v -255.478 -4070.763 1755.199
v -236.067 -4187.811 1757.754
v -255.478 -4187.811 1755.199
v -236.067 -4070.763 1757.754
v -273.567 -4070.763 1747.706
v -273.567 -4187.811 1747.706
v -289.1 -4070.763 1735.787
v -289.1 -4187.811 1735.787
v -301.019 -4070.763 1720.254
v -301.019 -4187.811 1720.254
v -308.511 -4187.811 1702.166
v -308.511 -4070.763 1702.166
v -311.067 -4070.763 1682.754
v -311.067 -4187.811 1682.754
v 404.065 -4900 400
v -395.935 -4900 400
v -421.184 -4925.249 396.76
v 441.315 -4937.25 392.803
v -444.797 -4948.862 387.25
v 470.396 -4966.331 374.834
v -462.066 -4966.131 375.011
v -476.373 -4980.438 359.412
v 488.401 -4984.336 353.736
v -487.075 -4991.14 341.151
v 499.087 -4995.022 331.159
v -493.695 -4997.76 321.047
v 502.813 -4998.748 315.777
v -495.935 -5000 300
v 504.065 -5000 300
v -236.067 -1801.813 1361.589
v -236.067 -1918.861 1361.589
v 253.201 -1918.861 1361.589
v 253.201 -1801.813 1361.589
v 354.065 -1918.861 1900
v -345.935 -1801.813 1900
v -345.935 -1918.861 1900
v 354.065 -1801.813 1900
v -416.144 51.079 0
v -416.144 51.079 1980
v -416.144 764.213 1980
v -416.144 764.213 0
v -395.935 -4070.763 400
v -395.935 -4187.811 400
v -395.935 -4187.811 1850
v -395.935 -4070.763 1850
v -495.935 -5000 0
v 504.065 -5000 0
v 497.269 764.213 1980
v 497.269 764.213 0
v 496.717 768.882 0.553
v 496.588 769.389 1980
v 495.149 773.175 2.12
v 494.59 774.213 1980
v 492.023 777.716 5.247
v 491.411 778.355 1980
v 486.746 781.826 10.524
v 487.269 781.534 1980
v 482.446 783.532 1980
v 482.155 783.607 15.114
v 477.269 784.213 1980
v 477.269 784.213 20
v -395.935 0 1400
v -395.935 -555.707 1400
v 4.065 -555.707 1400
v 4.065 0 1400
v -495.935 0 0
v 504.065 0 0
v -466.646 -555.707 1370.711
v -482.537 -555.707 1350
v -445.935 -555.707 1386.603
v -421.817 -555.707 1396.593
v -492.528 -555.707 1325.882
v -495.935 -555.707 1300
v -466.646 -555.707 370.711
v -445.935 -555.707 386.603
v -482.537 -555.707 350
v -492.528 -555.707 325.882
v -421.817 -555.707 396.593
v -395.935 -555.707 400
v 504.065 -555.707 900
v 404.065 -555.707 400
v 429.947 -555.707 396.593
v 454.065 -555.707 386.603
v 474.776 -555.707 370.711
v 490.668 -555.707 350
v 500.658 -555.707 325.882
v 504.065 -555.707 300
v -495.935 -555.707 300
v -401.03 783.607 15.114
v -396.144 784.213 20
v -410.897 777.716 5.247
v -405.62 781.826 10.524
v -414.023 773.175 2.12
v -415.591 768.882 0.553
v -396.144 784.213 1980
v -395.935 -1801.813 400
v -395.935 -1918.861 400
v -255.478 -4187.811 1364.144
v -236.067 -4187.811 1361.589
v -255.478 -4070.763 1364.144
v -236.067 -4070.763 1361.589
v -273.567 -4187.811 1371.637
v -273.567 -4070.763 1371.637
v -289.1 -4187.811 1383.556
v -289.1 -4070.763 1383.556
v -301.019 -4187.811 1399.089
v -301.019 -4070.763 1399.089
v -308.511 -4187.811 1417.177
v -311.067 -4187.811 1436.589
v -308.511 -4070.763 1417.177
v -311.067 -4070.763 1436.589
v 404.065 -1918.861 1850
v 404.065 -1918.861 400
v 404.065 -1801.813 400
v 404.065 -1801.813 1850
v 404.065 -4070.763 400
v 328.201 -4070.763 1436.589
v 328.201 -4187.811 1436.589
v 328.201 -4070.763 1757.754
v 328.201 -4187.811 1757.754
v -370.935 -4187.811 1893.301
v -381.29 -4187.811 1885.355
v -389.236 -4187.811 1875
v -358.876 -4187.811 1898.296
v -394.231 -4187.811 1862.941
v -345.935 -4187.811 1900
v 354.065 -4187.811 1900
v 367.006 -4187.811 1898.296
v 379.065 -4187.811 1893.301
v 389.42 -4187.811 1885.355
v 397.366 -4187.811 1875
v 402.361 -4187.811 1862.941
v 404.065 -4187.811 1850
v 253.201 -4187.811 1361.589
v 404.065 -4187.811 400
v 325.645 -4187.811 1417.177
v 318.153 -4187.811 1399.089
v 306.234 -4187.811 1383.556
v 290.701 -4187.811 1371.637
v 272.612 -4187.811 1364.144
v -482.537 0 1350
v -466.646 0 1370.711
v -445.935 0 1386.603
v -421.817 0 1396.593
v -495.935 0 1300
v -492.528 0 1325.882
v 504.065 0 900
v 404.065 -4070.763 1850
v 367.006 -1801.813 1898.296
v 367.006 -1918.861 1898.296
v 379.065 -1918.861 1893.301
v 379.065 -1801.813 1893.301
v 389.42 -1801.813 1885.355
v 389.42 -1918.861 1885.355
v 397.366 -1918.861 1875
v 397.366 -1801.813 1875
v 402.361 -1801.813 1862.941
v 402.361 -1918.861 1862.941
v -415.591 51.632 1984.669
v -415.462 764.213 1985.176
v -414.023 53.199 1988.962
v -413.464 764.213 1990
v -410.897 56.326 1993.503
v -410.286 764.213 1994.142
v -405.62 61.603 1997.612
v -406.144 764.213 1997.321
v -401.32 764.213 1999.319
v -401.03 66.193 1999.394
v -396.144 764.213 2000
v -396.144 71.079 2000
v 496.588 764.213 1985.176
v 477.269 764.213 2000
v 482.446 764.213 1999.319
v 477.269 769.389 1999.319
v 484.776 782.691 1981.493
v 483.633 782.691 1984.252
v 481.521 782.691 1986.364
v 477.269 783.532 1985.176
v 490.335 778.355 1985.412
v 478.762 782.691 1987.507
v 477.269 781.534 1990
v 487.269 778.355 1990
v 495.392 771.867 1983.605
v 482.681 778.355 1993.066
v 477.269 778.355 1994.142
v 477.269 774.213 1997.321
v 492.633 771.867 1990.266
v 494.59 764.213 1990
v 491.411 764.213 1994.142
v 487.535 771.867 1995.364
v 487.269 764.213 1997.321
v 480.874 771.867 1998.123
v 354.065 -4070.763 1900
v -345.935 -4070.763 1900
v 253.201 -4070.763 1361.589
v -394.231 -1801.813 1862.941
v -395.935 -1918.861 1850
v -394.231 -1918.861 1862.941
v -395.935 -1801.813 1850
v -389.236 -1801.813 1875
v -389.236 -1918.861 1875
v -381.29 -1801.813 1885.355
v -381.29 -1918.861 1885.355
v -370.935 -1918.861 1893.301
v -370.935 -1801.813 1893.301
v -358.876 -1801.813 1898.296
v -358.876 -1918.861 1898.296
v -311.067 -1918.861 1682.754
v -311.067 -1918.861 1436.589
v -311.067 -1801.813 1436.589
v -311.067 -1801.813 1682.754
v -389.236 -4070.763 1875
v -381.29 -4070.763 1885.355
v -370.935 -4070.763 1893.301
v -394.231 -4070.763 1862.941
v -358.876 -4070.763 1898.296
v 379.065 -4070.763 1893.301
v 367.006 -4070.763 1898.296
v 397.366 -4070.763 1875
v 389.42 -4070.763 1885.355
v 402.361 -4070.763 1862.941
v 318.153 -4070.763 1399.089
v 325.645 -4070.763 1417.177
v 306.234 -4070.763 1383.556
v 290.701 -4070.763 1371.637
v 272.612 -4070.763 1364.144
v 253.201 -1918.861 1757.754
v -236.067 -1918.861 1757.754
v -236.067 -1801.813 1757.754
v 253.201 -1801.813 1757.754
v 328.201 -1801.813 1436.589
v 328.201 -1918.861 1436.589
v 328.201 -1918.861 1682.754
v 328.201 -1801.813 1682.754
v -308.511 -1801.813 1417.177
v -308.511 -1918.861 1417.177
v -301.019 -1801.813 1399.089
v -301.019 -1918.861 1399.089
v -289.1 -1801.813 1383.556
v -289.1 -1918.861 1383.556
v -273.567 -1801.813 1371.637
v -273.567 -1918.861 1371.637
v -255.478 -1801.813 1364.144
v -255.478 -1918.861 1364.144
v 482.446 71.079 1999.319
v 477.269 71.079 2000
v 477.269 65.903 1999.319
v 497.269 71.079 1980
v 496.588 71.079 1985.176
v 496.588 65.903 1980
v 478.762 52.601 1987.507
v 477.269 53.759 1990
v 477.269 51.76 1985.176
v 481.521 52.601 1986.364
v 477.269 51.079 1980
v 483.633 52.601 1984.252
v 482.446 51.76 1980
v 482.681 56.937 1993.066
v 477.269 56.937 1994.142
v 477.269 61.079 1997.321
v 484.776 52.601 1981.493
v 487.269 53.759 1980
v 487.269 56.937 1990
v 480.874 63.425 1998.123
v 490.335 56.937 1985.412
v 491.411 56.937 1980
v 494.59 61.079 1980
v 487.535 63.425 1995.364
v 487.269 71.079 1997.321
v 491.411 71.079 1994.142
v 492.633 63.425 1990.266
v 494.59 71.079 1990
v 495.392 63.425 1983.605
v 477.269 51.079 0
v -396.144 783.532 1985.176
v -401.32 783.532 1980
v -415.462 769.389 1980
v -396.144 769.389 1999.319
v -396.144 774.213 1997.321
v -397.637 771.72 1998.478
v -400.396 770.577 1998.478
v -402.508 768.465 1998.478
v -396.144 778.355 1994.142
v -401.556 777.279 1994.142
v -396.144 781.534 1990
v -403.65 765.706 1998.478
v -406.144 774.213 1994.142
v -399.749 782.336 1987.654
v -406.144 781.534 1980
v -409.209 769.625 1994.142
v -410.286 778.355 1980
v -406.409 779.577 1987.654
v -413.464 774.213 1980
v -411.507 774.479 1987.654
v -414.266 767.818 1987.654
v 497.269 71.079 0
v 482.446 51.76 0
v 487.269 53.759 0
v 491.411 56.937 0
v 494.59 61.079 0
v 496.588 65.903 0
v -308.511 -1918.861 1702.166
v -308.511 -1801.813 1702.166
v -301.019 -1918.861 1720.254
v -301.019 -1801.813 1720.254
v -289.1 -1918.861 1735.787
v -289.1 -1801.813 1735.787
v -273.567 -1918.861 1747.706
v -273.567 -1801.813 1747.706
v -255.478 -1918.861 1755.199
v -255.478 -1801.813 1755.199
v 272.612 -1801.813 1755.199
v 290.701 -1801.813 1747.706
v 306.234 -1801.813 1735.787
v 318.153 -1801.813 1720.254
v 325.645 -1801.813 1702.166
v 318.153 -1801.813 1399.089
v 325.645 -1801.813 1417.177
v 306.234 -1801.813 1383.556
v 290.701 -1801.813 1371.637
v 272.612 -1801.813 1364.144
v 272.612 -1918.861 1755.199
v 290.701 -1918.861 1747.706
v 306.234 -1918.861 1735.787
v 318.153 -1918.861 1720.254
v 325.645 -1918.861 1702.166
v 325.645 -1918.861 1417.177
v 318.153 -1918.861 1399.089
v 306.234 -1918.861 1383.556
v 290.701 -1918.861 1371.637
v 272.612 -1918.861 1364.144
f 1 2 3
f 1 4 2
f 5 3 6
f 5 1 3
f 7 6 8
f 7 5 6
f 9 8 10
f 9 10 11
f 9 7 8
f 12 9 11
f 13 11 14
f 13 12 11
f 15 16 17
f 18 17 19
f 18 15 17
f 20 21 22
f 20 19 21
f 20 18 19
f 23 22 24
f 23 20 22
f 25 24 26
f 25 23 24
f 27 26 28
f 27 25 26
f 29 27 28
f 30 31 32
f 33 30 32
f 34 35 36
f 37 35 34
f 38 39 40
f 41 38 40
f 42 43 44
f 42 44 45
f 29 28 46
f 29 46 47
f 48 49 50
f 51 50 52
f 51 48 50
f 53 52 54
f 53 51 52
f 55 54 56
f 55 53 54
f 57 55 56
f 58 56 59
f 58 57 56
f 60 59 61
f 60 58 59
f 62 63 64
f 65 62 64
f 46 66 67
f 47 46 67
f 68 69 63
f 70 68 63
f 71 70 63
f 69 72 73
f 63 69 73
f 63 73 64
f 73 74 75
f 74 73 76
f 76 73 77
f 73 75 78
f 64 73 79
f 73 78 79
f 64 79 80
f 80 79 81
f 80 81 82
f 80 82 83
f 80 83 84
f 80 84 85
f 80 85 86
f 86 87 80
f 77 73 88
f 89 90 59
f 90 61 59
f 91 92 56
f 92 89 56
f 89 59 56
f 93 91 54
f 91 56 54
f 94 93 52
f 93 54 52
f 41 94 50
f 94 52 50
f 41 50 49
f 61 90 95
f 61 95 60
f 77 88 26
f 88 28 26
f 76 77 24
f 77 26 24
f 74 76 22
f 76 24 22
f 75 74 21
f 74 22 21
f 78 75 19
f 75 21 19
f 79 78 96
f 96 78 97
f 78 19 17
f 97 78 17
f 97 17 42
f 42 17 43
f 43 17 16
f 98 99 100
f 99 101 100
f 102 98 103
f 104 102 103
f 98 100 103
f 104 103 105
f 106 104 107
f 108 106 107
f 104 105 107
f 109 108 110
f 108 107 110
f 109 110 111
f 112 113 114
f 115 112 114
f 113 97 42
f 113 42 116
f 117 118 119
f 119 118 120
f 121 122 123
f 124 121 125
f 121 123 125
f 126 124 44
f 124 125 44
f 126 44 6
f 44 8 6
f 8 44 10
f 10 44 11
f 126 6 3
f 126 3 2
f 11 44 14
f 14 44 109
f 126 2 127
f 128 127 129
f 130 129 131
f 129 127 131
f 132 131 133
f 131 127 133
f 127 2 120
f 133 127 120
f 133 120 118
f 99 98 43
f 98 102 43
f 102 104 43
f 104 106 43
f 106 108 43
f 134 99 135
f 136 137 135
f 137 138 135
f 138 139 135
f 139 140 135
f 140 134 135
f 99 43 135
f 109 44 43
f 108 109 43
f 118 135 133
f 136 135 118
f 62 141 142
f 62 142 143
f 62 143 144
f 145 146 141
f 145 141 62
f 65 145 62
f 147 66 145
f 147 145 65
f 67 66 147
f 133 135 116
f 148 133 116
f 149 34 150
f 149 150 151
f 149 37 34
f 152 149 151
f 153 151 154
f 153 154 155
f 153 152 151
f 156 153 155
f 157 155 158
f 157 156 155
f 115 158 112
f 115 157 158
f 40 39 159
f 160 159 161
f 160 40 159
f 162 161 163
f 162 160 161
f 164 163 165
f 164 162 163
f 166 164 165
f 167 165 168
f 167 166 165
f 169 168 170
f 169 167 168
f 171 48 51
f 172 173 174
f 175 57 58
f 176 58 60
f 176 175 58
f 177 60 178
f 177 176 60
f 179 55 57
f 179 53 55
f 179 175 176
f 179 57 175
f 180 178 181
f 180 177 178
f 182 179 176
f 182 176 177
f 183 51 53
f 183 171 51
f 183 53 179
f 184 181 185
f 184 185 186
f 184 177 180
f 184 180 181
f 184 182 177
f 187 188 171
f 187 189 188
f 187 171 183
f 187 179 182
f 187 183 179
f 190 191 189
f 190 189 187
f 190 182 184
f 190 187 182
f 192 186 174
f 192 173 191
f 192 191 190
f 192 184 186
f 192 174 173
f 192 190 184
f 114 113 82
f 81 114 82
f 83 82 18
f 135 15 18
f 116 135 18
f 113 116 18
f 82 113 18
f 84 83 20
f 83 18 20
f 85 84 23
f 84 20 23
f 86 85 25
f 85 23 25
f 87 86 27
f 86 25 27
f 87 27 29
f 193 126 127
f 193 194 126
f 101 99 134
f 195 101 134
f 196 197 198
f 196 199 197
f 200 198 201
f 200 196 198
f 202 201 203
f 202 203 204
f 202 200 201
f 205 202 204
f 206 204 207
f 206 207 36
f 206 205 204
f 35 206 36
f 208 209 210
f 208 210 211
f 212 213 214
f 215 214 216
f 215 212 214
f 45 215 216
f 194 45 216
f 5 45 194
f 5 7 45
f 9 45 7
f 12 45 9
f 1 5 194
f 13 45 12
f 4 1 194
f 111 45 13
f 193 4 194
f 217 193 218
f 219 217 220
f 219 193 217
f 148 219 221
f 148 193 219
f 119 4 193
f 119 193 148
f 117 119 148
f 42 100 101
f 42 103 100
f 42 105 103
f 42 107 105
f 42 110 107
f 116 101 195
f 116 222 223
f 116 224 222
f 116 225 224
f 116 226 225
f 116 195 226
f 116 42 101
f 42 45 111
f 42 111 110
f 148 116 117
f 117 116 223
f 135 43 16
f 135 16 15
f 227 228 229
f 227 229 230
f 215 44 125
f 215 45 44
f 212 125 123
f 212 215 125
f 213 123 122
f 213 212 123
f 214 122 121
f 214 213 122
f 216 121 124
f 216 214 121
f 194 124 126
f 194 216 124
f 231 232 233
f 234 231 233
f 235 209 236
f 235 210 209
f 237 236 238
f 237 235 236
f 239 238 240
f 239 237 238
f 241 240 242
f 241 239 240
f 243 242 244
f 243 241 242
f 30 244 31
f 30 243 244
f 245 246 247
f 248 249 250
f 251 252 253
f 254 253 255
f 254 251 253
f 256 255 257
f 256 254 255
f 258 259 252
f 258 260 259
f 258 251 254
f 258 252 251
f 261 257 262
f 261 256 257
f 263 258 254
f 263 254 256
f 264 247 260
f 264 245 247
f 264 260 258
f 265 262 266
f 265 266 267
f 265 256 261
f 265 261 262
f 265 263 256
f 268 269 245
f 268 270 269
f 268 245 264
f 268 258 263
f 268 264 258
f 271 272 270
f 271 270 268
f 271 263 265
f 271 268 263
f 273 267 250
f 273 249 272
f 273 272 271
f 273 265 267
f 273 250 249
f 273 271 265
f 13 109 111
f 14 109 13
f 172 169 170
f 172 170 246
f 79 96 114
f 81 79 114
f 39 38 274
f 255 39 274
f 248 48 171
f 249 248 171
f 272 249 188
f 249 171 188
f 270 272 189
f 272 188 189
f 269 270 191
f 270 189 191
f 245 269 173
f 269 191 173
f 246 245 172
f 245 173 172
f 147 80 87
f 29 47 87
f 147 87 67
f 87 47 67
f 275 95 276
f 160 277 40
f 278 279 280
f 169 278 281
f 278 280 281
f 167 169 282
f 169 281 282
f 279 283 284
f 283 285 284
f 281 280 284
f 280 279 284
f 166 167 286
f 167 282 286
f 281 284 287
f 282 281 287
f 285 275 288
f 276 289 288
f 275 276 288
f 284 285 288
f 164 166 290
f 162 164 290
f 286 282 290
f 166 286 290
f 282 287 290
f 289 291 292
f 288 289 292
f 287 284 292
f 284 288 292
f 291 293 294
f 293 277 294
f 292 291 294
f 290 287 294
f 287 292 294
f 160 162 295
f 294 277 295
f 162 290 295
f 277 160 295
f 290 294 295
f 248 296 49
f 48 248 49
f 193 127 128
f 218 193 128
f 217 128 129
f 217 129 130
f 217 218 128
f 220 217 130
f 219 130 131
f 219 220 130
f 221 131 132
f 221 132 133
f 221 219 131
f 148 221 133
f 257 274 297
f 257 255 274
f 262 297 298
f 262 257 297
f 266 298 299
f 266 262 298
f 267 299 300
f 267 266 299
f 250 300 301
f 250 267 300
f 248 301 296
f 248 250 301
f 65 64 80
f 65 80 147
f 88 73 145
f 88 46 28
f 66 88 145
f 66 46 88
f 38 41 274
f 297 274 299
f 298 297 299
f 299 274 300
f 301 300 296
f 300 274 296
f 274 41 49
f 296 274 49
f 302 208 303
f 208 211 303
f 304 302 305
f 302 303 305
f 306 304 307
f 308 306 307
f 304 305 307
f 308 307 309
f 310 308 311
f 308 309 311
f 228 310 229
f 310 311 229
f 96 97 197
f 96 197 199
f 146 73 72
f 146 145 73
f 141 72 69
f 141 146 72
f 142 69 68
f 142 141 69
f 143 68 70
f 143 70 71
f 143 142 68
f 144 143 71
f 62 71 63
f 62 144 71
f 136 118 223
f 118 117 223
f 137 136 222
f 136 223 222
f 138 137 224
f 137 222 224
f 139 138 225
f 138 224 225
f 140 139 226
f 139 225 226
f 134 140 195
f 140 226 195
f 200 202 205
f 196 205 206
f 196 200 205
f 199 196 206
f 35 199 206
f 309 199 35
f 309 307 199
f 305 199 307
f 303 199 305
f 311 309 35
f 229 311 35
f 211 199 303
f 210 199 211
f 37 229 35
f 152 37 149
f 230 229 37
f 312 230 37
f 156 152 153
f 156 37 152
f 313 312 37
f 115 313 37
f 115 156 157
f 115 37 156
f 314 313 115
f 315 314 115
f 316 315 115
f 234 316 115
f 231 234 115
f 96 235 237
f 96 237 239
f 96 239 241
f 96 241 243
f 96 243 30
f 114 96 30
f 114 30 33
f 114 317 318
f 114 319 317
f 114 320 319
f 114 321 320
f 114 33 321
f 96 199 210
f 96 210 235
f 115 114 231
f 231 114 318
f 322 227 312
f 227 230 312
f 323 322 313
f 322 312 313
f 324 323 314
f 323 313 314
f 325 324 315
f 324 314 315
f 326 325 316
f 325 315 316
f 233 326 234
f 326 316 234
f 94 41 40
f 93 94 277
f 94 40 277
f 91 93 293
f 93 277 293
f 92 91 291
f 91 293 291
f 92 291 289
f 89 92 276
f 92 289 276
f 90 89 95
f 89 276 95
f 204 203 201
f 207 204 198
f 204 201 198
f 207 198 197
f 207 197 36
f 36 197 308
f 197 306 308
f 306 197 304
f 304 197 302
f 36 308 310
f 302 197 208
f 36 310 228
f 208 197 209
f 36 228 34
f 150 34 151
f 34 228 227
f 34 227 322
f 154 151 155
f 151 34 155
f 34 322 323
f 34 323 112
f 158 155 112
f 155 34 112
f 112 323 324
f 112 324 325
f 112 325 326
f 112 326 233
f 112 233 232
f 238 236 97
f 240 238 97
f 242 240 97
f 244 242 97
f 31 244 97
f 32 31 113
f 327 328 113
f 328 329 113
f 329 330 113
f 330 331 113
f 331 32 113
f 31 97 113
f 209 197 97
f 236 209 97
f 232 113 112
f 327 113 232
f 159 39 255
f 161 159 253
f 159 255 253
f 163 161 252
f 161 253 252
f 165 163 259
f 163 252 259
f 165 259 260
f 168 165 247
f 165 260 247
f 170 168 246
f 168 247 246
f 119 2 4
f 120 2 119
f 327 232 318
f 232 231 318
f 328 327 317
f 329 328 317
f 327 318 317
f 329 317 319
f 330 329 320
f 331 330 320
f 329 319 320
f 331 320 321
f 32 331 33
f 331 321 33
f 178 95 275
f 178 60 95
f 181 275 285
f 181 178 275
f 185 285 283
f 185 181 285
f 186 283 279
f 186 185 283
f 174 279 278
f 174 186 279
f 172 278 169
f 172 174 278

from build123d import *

# Parameters (mm, degrees)
F0_W      = 1000
F0_H      = 400
F1_DEPTH  = 5000
F2_W      = 1000
F2_H      = 555.7073950768
F3_DEPTH  = 1000
F4_R      = 100
F5_W      = 800
F5_H      = 117.048740387
F6_DEPTH  = 1500
F7_R      = 50
F8_SIZE   = 500
F9_W      = 639.2677426338
F9_H      = 396.1658477783
F10_DEPTH = 2385.9988451004
F11_R     = 75
F12_W     = 913.4129881859
F12_H     = 733.1340499222
F13_DEPTH = 2000
F14_R     = 20


with BuildPart() as f1:
    # F0 (on Front) → F1 (new body)
    with BuildSketch(Plane.XZ):
        with Locations((4.065050291, 200)):
            Rectangle(F0_W, F0_H)
    extrude(amount=F1_DEPTH)

    # F2 (on face) → F3 (join)
    with BuildSketch(Plane.XY.offset(400)):
        with Locations((4.065050291, -277.8536975384)):
            Rectangle(F2_W, F2_H)
    extrude(amount=F3_DEPTH)

    # F4
    f4_edges = [f1.edges().sort_by_distance(p)[0] for p in [
        (-495.93495, -277.853698, 1400),
        (-495.93495, -2777.853698, 400),
        (504.06505, -2777.853698, 400),
        (4.06505, -5000, 400),
    ]]
    fillet(f4_edges, radius=F4_R)

    # F5 (on face) → F6 (join)
    with BuildSketch(Plane.XY.offset(400)):
        with Locations((4.065050291, -4129.2870044708)):
            Rectangle(F5_W, F5_H)
        with Locations((4.065050291, -1860.3368997574)):
            Rectangle(F5_W, F5_H)
    extrude(amount=F6_DEPTH)

    # F7
    f7_edges = [f1.edges().sort_by_distance(p)[0] for p in [
        (404.06505, -4129.287004, 1900),
        (404.06505, -1860.3369, 1900),
        (-395.93495, -1860.3369, 1900),
        (-395.93495, -4129.287004, 1900),
    ]]
    fillet(f7_edges, radius=F7_R)

    # F8
    f8_edges = [f1.edges().sort_by_distance(p)[0] for p in [
        (504.06505, -277.853698, 1400),
    ]]
    chamfer(f8_edges, length=F8_SIZE)

    # F9 (on face) → F10 (cut, through all)
    with BuildSketch(Plane.XZ.offset(4187.8113746643)):
        with Locations((8.5670053959, 1559.6715211868)):
            Rectangle(F9_W, F9_H)
    extrude(amount=-F10_DEPTH, mode=Mode.SUBTRACT)

    # F11
    f11_edges = [f1.edges().sort_by_distance(p)[0] for p in [
        (-311.066866, -4129.287004, 1757.754445),
        (-311.066866, -1860.3369, 1757.754445),
        (-311.066866, -4129.287004, 1361.588597),
        (-311.066866, -1860.3369, 1361.588597),
        (328.200877, -1860.3369, 1361.588597),
        (328.200877, -4129.287004, 1361.588597),
        (328.200877, -1860.3369, 1757.754445),
    ]]
    fillet(f11_edges, radius=F11_R)


with BuildPart() as f13:
    # F12 (on Top) → F13 (new body)
    with BuildSketch(Plane.XY):
        with Locations((40.562748909, 417.64604114)):
            Rectangle(F12_W, F12_H)
    extrude(amount=F13_DEPTH)

    # F14
    f14_edges = [f13.edges().sort_by_distance(p)[0] for p in [
        (497.269243, 417.646041, 2000),
        (497.269243, 784.213066, 1000),
        (-416.143745, 784.213066, 1000),
        (40.562749, 784.213066, 0),
        (40.562749, 784.213066, 2000),
        (-416.143745, 417.646041, 2000),
        (40.562749, 51.079016, 2000),
        (497.269243, 51.079016, 1000),
    ]]
    fillet(f14_edges, radius=F14_R)


solid = Compound([f1.part, f13.part])
